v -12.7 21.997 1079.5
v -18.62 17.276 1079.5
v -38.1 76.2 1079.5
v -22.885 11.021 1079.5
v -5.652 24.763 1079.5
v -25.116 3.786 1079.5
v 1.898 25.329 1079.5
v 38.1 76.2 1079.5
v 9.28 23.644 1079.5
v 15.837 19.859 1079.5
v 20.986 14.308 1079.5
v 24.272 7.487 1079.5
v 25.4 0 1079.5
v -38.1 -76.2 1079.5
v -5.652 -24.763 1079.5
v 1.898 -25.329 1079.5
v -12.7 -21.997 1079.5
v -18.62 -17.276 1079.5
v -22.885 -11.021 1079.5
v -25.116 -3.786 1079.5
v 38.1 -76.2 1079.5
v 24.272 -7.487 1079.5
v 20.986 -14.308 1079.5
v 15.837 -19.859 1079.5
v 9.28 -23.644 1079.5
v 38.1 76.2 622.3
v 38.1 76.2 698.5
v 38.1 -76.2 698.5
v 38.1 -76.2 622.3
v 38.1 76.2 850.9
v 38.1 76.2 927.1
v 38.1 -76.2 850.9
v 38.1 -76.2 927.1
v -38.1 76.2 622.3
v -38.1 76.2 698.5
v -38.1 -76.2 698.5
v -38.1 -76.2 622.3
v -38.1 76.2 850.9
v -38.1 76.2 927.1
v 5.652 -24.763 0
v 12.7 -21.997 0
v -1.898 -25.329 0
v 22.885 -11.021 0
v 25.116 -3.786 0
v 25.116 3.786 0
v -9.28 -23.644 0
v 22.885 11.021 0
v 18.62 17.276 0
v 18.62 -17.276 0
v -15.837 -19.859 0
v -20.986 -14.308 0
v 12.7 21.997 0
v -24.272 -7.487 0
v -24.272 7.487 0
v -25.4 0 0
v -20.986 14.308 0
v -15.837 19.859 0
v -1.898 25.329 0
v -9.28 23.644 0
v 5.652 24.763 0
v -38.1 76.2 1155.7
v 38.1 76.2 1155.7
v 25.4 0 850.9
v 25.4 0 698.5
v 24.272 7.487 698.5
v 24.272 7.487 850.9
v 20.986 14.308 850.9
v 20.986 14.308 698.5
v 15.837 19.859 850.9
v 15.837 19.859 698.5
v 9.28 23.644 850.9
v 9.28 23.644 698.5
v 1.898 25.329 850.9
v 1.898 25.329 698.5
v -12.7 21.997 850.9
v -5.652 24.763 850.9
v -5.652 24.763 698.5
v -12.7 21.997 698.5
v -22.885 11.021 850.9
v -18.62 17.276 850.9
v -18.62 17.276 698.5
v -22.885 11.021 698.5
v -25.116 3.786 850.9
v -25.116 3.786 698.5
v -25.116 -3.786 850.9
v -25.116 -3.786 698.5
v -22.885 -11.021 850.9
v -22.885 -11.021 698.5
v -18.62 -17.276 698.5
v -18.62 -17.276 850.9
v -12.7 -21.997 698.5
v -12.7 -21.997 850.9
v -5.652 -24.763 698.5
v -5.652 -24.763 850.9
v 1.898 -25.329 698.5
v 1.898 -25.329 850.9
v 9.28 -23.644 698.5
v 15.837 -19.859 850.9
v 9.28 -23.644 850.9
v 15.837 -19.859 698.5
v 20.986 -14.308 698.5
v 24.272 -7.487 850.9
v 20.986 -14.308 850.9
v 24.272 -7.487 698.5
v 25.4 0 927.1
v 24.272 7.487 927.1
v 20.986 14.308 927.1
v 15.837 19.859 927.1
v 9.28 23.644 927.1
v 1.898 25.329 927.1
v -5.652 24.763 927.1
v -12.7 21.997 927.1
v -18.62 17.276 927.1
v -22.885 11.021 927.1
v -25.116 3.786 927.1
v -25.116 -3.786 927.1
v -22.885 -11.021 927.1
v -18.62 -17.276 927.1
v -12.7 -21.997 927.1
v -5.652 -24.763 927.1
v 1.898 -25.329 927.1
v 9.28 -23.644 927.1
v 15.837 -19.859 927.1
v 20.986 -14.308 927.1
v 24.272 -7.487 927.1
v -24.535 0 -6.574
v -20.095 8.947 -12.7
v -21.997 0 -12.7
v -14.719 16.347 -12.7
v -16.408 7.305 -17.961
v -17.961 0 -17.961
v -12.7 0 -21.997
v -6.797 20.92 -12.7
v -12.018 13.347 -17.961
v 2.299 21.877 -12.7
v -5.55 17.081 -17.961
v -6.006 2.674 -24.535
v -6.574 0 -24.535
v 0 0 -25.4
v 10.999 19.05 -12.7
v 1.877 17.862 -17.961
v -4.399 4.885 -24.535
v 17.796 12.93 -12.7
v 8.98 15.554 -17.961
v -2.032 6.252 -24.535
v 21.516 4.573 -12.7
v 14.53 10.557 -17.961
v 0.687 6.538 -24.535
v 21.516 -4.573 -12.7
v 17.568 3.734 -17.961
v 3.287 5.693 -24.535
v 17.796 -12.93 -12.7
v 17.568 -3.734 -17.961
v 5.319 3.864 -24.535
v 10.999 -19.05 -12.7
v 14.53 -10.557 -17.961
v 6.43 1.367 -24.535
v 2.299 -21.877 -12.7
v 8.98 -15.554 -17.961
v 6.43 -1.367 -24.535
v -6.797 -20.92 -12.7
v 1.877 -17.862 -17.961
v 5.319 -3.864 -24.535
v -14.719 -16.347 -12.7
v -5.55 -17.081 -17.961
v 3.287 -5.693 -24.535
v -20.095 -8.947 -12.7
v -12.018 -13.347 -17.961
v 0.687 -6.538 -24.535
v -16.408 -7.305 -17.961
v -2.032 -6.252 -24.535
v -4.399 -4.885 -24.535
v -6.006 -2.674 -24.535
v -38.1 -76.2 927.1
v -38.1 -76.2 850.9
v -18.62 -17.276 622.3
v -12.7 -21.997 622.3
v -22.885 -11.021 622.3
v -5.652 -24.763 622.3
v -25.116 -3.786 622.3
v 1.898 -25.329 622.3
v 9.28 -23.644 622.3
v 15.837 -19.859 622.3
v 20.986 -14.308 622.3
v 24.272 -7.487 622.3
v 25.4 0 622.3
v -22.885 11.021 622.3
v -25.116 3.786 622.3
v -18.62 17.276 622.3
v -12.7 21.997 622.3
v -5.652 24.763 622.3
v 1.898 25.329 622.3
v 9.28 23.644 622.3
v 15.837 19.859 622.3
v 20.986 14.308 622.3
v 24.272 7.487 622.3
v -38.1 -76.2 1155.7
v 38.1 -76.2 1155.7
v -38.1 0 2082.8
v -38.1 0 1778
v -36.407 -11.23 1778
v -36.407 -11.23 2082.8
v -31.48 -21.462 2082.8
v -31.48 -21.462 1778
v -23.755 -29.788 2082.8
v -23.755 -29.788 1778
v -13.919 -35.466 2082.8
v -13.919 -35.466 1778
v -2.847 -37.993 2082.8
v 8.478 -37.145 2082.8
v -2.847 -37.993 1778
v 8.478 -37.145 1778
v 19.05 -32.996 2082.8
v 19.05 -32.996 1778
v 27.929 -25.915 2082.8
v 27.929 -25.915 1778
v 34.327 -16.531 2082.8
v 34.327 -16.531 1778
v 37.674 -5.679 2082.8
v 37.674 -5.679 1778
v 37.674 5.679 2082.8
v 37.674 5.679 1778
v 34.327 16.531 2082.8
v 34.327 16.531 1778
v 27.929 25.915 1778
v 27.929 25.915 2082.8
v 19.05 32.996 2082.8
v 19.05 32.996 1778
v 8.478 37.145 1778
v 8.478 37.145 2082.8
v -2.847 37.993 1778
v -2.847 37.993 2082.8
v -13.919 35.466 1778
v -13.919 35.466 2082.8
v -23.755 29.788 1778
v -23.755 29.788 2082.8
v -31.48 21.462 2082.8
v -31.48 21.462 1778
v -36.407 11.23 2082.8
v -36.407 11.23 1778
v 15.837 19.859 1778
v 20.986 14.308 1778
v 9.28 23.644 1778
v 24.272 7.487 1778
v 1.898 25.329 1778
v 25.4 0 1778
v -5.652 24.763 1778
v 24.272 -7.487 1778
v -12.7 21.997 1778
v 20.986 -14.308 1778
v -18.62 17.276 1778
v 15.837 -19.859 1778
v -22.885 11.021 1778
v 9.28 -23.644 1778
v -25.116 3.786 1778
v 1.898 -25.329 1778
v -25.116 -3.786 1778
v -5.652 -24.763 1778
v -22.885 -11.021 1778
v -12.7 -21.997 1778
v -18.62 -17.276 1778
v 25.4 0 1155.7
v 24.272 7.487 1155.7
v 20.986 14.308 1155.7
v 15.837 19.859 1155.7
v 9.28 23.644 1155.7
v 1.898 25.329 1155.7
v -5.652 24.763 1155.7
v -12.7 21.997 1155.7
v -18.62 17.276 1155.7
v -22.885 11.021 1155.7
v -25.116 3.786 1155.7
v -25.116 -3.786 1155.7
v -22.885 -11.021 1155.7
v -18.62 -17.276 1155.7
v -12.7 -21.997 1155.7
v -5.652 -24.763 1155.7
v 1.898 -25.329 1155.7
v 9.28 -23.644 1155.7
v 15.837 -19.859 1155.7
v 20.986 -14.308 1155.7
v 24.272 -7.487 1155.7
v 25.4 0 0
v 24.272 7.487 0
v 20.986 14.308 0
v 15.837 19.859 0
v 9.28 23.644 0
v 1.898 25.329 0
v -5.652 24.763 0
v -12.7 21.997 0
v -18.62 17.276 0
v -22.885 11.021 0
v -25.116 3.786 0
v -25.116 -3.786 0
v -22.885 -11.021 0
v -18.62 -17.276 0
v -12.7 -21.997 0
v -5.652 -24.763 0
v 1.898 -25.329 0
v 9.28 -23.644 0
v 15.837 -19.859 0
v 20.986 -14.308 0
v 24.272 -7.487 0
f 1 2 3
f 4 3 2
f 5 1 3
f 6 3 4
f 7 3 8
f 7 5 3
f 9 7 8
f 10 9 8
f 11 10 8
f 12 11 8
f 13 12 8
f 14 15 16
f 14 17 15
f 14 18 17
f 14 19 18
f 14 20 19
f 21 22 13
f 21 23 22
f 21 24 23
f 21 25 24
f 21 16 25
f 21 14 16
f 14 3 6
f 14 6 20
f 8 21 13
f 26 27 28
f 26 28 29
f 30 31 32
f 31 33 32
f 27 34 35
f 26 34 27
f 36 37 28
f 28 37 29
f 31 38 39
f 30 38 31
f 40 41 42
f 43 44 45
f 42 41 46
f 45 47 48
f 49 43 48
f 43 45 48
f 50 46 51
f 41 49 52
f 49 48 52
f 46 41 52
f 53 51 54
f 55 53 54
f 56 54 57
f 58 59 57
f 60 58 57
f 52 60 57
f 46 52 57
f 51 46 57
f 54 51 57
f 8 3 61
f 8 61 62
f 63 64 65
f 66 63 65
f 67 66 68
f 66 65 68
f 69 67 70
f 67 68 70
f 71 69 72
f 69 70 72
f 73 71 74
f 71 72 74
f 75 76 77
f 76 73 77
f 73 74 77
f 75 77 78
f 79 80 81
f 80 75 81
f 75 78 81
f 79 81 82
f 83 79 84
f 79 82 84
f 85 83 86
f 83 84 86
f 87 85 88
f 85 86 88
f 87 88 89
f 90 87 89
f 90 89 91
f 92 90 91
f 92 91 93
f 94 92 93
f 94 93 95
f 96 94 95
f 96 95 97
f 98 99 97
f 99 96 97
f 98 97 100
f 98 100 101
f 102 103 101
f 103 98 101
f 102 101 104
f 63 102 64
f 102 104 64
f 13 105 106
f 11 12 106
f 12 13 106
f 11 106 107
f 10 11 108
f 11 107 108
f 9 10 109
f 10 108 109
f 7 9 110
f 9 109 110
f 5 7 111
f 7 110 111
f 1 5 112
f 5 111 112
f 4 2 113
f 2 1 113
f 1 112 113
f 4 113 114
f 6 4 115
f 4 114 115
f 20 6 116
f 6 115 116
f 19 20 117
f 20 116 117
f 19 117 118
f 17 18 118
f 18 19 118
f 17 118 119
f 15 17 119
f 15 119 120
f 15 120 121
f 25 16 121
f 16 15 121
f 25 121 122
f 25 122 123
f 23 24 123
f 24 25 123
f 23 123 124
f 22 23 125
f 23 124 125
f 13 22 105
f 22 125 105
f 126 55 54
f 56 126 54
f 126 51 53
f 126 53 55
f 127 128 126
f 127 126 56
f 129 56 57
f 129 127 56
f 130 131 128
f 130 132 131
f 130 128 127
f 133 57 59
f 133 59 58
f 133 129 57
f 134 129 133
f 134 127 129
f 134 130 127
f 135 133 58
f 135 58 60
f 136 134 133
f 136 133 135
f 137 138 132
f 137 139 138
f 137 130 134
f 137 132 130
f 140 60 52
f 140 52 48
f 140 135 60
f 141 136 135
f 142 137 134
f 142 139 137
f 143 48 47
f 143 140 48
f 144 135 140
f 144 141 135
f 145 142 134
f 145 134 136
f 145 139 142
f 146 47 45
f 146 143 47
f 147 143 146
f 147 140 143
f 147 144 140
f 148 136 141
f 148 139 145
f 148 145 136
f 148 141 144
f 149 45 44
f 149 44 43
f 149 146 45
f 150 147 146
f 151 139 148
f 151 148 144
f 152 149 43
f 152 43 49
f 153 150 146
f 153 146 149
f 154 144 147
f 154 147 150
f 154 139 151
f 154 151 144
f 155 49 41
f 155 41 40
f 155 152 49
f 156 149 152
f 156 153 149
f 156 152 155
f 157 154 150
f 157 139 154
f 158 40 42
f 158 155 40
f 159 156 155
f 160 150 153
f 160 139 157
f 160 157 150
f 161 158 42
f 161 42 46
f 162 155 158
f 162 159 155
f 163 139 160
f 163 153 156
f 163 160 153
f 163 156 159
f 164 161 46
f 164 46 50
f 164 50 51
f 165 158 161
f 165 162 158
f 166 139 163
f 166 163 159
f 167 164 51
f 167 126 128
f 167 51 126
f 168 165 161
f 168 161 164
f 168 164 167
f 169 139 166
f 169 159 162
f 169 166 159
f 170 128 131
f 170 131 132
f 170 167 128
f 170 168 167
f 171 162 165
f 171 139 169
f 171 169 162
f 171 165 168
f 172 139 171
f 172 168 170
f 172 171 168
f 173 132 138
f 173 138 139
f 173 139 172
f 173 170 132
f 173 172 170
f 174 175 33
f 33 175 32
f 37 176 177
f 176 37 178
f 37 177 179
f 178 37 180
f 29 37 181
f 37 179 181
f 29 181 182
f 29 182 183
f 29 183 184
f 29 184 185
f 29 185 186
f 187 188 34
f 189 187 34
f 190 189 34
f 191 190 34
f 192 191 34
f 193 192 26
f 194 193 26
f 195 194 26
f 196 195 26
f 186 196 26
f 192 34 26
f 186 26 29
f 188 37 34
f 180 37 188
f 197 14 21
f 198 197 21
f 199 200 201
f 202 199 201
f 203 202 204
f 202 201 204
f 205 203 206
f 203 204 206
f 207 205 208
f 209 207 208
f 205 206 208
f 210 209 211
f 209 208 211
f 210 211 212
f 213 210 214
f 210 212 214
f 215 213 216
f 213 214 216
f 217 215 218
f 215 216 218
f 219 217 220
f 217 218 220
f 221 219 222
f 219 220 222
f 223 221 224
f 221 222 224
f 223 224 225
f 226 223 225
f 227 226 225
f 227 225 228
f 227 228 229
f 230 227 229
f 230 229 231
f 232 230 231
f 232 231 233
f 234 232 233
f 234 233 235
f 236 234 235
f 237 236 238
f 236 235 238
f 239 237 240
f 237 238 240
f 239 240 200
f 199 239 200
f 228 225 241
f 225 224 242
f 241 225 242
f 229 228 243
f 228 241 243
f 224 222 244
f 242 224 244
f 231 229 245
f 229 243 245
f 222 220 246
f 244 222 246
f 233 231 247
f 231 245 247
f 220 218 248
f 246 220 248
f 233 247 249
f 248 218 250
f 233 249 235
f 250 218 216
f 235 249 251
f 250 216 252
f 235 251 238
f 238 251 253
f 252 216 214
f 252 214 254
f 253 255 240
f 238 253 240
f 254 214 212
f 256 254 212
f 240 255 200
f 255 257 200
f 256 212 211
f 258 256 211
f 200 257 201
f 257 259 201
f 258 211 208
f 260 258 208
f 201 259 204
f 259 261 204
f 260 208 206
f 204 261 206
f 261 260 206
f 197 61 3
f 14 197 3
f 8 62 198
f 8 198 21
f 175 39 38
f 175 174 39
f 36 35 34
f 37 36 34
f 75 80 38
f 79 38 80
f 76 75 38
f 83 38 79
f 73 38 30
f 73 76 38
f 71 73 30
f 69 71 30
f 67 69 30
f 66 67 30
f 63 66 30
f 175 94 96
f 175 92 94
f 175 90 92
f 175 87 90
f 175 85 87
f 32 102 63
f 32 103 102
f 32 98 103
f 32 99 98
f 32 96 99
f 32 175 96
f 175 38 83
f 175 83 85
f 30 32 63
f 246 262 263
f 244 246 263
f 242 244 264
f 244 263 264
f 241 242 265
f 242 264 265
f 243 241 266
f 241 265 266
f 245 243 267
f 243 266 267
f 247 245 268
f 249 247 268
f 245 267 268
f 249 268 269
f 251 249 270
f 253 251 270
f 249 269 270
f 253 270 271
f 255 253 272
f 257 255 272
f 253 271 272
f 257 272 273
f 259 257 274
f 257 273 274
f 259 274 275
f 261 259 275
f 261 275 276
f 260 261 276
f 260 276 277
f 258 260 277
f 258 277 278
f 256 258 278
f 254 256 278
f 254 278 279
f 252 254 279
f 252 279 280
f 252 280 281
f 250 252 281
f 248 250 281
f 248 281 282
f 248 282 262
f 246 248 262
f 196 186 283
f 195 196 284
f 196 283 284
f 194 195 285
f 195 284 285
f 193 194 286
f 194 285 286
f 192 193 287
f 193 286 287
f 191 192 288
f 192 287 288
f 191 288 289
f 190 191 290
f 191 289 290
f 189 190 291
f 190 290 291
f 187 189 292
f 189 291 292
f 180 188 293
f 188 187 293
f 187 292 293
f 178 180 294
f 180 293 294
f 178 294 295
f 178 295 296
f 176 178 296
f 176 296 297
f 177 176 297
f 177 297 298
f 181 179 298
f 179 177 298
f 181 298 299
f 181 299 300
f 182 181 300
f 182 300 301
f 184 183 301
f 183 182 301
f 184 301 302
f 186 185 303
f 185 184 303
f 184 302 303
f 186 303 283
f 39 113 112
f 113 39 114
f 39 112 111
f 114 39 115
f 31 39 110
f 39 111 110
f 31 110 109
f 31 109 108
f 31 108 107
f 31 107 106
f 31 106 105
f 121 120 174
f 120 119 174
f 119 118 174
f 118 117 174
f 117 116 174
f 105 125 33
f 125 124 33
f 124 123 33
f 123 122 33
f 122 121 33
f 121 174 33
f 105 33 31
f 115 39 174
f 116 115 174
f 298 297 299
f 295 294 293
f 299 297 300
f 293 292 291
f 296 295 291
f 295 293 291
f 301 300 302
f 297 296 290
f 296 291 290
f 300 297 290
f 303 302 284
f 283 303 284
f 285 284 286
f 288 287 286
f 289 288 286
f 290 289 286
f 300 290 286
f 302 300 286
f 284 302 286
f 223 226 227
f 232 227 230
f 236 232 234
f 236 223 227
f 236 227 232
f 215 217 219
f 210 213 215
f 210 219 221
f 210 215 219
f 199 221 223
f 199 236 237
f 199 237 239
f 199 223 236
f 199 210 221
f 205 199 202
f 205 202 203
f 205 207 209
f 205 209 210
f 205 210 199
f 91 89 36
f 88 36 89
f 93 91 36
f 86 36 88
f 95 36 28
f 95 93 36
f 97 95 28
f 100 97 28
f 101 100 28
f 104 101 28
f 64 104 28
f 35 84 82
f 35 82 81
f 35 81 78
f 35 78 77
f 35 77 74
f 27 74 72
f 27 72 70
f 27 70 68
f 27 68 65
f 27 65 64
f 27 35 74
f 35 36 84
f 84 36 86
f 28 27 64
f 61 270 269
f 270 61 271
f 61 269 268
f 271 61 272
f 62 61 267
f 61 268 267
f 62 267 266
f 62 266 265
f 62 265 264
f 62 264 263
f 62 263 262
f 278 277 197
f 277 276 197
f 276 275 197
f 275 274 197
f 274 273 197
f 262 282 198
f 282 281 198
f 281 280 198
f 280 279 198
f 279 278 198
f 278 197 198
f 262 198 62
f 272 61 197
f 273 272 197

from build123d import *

# Parameters (mm, degrees)
SKETCH1_R           = 25.4
BOSS_EXTRUDE1_DEPTH = 1778
SKETCH2_R           = 38.1
BOSS_EXTRUDE2_DEPTH = 304.8
SKETCH4_W           = 76.2
SKETCH4_H           = 76.2
BOSS_EXTRUDE4_DEPTH = 76.2
SKETCH5_R           = 25.4
BOSS_EXTRUDE5_DEPTH = 25.4
FILLET1_R           = 25.4


with BuildPart() as part:
    # Sketch1 → Boss-Extrude1 (new body)
    with BuildSketch(Plane.XY):
        Circle(SKETCH1_R)
    extrude(amount=BOSS_EXTRUDE1_DEPTH)

    # Sketch2 → Boss-Extrude2 (add)
    with BuildSketch(Plane.XY.offset(1778)):
        with Locations(Location((0, 0, 0), (0, 0, 180))):
            Circle(SKETCH2_R)
    extrude(amount=BOSS_EXTRUDE2_DEPTH)

    # Sketch4 → Boss-Extrude4 (add, symmetric)
    with BuildSketch(Plane(origin=(0, 0, 0), x_dir=(1, 0, 0), z_dir=(0, 1, 0))):
        with Locations((0, -889)):
            Rectangle(SKETCH4_W, SKETCH4_H)
        with Locations((0, -1117.6)):
            Rectangle(SKETCH4_W, SKETCH4_H)
        with Locations((0, -660.4)):
            Rectangle(SKETCH4_W, SKETCH4_H)
    extrude(amount=BOSS_EXTRUDE4_DEPTH, both=True)


with BuildPart() as body_2:
    # Sketch5 → Boss-Extrude5 (new body)
    with BuildSketch(Plane(origin=(0, 0, 0), x_dir=(-1, 0, 0), z_dir=(0, 0, -1))):
        Circle(SKETCH5_R)
    extrude(amount=BOSS_EXTRUDE5_DEPTH)

    # Fillet1
    fillet1_edges = [body_2.edges().sort_by_distance(p)[0] for p in [
        (25.4, 0, -25.4),
    ]]
    fillet(fillet1_edges, radius=FILLET1_R - 0.0001)  # a hair under: the kernel refuses the full size


solid = Compound([part.part, body_2.part])
